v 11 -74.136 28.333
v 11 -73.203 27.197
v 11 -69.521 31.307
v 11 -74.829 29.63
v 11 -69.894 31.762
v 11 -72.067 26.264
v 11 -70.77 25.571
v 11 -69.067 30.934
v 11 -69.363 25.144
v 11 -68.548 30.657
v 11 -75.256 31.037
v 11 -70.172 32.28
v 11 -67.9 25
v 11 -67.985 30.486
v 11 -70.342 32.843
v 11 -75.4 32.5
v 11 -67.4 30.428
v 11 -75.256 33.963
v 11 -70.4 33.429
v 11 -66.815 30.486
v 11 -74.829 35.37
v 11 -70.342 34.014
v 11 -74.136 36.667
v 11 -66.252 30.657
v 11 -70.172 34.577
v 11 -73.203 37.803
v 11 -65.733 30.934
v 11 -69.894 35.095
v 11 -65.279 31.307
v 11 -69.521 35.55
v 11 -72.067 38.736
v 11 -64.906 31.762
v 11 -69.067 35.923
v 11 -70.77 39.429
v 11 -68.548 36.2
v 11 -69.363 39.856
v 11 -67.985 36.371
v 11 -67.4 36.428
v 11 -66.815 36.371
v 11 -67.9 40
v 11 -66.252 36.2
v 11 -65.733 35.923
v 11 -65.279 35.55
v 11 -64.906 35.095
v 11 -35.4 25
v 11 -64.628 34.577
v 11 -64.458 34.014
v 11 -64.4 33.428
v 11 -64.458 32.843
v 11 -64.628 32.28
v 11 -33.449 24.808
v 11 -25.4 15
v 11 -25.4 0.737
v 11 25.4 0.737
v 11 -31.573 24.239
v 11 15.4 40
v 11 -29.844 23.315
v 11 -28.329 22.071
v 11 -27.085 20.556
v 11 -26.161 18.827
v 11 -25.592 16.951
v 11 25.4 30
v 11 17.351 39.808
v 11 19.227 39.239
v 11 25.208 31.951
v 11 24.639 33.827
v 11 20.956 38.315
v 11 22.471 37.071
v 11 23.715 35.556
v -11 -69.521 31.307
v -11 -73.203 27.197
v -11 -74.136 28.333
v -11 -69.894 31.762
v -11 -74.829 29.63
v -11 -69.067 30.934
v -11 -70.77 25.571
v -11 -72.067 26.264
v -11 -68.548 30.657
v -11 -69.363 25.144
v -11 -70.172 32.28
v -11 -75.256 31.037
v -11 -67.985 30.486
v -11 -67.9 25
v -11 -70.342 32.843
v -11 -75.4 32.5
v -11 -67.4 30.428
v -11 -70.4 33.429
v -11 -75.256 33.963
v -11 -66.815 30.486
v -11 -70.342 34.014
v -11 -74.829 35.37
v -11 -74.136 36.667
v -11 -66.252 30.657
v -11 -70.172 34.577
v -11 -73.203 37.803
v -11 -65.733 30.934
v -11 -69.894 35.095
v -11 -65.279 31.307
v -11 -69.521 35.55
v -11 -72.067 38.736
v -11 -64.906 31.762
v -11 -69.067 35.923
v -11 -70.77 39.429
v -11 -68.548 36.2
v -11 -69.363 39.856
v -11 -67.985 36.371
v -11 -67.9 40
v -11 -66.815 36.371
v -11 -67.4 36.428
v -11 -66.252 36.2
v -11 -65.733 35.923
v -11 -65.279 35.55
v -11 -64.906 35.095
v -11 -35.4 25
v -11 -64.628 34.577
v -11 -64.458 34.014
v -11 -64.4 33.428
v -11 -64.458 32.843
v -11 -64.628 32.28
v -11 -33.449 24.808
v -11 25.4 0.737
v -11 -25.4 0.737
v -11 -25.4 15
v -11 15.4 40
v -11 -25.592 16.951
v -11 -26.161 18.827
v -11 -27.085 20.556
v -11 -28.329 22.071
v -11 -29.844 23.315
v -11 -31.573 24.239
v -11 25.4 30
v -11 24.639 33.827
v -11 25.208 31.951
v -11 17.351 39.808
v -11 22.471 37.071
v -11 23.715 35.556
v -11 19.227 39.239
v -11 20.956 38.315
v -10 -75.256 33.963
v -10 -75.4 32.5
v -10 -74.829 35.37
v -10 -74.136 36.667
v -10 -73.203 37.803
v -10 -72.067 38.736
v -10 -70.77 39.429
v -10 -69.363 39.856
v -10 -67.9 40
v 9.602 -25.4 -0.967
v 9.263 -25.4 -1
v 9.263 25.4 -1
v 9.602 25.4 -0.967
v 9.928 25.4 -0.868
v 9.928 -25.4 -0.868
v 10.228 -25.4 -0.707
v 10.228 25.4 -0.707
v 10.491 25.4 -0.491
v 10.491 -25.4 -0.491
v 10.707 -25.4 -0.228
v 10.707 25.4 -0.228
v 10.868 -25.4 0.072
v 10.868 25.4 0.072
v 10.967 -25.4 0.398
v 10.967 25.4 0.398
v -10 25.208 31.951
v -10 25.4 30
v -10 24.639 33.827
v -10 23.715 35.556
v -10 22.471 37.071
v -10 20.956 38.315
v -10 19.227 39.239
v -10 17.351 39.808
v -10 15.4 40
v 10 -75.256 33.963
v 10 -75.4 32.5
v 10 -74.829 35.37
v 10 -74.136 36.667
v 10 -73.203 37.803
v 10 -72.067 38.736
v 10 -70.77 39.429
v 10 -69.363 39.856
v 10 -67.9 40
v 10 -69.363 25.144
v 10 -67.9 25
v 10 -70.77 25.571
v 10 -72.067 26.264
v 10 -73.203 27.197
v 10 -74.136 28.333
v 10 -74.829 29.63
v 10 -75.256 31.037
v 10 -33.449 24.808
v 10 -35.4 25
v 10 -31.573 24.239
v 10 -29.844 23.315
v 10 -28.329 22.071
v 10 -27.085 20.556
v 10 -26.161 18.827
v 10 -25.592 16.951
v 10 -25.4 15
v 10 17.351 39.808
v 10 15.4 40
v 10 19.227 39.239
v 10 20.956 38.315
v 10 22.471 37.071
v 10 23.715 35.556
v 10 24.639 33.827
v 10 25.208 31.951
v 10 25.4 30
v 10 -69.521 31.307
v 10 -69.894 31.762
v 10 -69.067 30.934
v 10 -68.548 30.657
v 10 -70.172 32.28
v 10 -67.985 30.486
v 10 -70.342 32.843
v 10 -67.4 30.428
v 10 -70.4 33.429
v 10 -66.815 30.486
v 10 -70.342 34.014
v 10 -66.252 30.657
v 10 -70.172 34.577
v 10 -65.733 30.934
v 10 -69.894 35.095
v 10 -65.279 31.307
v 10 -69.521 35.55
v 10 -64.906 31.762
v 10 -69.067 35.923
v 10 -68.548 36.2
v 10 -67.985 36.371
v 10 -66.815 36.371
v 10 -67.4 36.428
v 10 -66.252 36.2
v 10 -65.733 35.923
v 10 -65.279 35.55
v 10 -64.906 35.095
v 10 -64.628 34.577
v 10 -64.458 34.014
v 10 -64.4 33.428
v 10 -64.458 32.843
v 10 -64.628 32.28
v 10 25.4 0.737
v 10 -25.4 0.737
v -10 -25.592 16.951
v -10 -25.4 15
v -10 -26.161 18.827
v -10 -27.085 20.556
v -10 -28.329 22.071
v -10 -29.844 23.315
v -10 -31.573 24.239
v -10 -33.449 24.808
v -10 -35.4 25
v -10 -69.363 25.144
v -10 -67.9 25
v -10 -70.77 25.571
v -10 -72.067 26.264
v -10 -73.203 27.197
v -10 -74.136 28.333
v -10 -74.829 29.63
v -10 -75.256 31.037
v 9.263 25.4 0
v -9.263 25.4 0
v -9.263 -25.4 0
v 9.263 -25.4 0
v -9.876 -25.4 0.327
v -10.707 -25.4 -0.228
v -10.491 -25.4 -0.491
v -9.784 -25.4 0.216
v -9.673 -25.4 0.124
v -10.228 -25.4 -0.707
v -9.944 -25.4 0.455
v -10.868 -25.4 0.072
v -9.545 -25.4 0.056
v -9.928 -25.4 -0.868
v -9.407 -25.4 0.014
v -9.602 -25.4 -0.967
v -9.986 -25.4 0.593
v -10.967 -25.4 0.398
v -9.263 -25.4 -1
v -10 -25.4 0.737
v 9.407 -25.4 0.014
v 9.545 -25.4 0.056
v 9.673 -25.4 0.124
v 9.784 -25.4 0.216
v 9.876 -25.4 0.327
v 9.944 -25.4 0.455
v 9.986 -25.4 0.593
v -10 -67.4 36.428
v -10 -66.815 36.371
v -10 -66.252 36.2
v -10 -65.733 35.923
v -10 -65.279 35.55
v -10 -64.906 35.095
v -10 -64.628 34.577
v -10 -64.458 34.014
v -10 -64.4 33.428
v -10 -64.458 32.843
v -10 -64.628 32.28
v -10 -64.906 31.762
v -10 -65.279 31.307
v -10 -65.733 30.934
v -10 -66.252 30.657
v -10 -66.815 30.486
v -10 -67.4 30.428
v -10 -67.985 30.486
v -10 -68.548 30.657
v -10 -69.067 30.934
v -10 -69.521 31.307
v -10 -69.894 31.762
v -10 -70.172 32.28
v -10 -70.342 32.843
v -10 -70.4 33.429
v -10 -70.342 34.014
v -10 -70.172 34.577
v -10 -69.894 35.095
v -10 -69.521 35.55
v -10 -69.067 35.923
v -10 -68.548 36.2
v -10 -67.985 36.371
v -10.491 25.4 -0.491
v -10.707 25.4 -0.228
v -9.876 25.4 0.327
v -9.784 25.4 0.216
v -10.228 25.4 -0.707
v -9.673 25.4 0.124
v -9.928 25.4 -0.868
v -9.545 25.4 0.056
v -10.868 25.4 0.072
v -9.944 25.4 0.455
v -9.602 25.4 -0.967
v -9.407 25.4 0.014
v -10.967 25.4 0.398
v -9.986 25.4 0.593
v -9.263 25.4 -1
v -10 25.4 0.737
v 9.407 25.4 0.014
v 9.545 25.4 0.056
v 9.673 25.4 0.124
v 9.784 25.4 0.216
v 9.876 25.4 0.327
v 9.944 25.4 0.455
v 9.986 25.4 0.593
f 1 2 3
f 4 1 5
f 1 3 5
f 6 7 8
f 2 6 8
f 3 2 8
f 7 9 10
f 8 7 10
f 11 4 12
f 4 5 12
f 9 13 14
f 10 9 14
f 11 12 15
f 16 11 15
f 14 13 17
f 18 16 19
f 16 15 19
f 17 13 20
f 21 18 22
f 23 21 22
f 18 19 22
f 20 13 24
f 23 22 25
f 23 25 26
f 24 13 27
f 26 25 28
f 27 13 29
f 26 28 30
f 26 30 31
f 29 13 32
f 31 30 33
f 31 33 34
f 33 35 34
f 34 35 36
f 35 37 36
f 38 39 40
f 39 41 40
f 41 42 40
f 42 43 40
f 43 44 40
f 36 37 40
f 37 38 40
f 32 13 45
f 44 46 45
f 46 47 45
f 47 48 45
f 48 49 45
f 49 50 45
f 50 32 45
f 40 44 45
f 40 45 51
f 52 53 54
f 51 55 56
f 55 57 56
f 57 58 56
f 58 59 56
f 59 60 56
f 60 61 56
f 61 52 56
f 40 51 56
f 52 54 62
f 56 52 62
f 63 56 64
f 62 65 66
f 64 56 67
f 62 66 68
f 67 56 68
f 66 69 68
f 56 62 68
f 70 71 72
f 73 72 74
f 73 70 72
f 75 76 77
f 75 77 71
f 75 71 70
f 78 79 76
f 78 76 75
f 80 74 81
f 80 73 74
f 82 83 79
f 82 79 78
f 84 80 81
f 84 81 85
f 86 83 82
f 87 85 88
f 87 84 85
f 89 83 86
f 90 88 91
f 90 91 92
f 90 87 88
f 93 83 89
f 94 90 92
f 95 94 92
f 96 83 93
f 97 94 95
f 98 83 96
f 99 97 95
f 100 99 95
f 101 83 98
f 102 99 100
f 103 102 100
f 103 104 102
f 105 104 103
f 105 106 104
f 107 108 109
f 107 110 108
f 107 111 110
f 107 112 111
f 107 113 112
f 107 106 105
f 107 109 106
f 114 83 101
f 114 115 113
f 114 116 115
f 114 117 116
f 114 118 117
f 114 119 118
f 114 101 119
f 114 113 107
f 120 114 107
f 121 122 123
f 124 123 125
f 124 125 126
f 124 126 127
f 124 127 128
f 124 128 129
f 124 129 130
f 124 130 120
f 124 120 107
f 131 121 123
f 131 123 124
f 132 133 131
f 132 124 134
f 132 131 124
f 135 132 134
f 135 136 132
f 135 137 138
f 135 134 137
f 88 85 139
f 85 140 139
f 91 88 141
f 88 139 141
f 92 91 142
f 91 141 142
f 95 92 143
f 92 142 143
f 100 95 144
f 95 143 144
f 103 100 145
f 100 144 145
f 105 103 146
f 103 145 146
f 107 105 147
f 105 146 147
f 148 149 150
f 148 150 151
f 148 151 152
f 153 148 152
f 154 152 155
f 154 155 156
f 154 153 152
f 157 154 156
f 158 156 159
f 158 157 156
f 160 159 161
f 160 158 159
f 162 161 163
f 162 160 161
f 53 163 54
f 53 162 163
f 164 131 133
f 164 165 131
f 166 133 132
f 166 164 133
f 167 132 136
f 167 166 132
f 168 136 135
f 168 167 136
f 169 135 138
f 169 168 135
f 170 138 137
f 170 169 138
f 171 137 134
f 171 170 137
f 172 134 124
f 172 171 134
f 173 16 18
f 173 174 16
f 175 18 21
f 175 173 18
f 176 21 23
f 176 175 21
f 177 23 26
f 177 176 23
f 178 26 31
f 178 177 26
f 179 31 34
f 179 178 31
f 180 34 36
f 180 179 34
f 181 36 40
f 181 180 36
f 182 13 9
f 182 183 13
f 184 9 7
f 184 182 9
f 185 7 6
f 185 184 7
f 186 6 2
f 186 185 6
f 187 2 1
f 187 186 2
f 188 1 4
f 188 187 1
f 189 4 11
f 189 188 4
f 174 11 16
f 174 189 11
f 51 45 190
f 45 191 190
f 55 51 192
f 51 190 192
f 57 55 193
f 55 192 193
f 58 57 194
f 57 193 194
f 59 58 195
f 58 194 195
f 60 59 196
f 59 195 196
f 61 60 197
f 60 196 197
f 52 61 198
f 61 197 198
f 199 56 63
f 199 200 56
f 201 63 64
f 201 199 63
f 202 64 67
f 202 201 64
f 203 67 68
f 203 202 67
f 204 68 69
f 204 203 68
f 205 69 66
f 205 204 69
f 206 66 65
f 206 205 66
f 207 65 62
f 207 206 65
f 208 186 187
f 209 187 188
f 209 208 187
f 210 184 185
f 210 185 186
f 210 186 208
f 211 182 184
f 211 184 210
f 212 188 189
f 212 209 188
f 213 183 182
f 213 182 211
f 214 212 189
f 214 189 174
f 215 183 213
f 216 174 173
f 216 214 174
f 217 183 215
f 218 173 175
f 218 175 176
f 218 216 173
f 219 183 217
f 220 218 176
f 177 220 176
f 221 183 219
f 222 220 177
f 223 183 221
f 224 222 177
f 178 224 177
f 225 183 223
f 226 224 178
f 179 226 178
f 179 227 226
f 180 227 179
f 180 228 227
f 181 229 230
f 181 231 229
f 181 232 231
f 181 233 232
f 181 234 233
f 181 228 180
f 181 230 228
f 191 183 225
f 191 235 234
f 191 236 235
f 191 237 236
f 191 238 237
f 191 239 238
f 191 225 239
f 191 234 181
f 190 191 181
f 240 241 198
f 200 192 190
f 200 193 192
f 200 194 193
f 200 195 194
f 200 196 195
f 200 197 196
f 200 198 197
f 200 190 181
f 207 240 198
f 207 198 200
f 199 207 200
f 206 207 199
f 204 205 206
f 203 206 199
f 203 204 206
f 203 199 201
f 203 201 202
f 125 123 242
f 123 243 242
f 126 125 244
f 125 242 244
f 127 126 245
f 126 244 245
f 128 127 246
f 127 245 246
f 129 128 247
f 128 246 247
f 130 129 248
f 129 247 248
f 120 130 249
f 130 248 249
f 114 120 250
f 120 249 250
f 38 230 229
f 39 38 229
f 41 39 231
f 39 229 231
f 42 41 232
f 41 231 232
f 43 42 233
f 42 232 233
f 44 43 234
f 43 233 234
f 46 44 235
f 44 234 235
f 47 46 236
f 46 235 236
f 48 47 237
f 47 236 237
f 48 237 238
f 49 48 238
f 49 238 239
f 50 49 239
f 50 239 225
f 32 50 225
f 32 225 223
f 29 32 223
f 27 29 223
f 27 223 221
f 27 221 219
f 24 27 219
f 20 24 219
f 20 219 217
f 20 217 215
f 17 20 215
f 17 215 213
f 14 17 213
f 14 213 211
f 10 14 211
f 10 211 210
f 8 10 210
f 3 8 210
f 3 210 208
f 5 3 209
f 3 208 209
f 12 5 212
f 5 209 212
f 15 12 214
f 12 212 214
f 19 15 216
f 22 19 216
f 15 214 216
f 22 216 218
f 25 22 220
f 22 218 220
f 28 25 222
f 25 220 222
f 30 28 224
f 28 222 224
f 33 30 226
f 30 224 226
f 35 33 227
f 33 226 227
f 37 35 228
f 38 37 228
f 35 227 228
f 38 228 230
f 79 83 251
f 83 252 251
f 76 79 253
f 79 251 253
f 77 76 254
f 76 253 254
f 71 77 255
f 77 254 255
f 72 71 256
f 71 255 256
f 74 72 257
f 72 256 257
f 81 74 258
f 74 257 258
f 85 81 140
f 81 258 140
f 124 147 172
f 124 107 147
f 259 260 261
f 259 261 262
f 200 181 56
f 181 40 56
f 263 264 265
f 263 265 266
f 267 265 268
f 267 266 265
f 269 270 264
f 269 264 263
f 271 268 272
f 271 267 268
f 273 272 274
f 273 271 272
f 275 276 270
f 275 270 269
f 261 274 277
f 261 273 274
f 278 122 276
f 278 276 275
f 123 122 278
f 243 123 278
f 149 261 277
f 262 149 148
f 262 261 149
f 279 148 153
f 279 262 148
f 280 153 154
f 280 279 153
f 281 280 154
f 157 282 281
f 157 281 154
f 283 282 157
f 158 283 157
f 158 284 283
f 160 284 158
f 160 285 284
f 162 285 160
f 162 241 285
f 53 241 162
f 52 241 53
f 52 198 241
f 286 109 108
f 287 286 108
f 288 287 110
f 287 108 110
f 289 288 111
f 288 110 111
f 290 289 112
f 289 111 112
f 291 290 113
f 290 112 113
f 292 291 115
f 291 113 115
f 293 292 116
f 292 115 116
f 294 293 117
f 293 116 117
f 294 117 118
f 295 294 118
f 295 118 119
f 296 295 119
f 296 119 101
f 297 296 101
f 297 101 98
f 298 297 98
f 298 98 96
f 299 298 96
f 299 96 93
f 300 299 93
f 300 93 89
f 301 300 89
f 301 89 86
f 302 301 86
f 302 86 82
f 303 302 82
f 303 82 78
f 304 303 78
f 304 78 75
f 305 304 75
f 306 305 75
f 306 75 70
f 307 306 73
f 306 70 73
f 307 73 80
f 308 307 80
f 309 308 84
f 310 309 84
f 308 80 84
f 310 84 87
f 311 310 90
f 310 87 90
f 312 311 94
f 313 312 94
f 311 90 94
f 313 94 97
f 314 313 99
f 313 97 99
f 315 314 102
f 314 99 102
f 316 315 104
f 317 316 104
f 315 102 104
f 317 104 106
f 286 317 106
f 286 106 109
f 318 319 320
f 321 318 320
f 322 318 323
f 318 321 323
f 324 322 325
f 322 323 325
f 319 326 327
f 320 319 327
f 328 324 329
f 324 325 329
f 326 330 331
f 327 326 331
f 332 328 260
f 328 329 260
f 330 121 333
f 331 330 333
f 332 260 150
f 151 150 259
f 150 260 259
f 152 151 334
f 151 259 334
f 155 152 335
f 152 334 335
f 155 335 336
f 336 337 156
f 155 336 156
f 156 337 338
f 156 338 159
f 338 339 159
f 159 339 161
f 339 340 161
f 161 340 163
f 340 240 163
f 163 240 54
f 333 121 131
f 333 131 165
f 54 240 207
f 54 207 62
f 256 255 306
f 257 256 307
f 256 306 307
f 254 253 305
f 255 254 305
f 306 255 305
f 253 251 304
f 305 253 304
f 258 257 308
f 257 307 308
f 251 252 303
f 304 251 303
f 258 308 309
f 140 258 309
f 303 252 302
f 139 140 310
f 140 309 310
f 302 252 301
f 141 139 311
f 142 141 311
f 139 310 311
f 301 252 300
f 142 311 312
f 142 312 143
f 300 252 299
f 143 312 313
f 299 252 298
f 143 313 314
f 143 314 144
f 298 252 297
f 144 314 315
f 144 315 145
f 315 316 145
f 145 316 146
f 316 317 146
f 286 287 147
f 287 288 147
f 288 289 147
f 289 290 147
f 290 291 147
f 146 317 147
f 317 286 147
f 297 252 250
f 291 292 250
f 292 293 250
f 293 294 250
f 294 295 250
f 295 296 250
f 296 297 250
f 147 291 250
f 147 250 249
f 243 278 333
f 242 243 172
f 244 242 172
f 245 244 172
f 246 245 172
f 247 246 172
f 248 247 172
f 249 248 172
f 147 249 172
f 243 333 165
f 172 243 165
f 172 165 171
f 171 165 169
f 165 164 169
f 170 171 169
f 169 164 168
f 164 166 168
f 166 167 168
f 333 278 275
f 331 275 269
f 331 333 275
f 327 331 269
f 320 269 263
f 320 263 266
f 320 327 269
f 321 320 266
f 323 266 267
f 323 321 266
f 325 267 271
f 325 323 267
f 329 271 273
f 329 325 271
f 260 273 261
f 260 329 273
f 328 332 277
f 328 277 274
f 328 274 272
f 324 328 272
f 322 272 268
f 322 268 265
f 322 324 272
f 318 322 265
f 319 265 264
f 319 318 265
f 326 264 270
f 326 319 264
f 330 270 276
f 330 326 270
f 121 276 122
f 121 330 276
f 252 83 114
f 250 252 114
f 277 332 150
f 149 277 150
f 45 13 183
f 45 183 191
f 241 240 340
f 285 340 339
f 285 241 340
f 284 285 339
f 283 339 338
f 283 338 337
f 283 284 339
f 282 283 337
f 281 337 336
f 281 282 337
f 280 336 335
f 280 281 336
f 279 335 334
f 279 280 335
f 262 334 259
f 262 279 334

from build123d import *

# Parameters (mm, degrees)
CROQUIS1_W                         = 20
CROQUIS1_H                         = 50.8
BRIDA_BASE1_DEPTH                  = 1
BRIDA_DE_ARISTA1_STRIP_W           = 5.4732
BRIDA_DE_ARISTA1_STRIP_H           = 1
BRIDA_DE_ARISTA1_STRIP_CUT_DEPTH   = 50.8
BRIDA_DE_ARISTA1_STRIP_2_W         = 5.4732
BRIDA_DE_ARISTA1_STRIP_2_H         = 1
BRIDA_DE_ARISTA1_STRIP_CUT_2_DEPTH = 50.8
BRIDA_DE_ARISTA1_DEPTH             = 50.8
BRIDA_DE_ARISTA1_BEND_DEPTH        = 50.8
CROQUIS14_W                        = 15
CROQUIS14_H                        = 50
PESTA_A1_DEPTH                     = 1
CROQUIS17_R                        = 3
CORTAR_EXTRUIR1_DEPTH              = 89.14283862
REDONDEO1_R                        = 10
REDONDEO2_R                        = 7.5


# Sheet-metal steps are written as plain solids
with BuildPart() as part:
    # Croquis1 → Brida base1 (new body)
    with BuildSketch(Plane.XY):
        Rectangle(CROQUIS1_W, CROQUIS1_H)
    extrude(amount=-BRIDA_BASE1_DEPTH)

    # Brida de arista1 strip (across the edge) → Brida de arista1 strip cut (cut)
    with BuildSketch(Plane(origin=(-10, 25.4, 0), x_dir=(1, 0, 0), z_dir=(0, -1, 0))):
        with Locations((-2, -0.5)):
            Rectangle(BRIDA_DE_ARISTA1_STRIP_W, BRIDA_DE_ARISTA1_STRIP_H)
    extrude(amount=BRIDA_DE_ARISTA1_STRIP_CUT_DEPTH, mode=Mode.SUBTRACT)

    # Brida de arista1 strip 2 (across the edge) → Brida de arista1 strip cut 2 (cut)
    with BuildSketch(Plane(origin=(10, -25.4, 0), x_dir=(-1, 0, 0), z_dir=(0, 1, 0))):
        with Locations((-2, -0.5)):
            Rectangle(BRIDA_DE_ARISTA1_STRIP_2_W, BRIDA_DE_ARISTA1_STRIP_2_H)
    extrude(amount=BRIDA_DE_ARISTA1_STRIP_CUT_2_DEPTH, mode=Mode.SUBTRACT)

    # Brida de arista1 section (across the edge) → Brida de arista1 (add)
    with BuildSketch(Plane(origin=(-10, 25.4, 0), x_dir=(1, 0, 0), z_dir=(0, -1, 0))):
        with BuildLine():
            Line((-1, 0.7366), (-1, 40))
            Line((-1, 40), (0, 40))
            Line((0, 40), (0, 0.7366))
            ThreePointArc((0, 0.7366), (0.215745145, 0.215745145), (0.7366, 0))
            Line((0.7366, 0), (0.7366, -1))
            ThreePointArc((0.7366, -1), (-0.491361636, -0.491361636), (-1, 0.7366))
        make_face()
    extrude(amount=BRIDA_DE_ARISTA1_DEPTH)

    # Brida de arista1 section 2 (across the edge) → Brida de arista1 bend (add)
    with BuildSketch(Plane(origin=(10, -25.4, 0), x_dir=(-1, 0, 0), z_dir=(0, 1, 0))):
        with BuildLine():
            Line((-1, 0.7366), (-1, 40))
            Line((-1, 40), (0, 40))
            Line((0, 40), (0, 0.7366))
            ThreePointArc((0, 0.7366), (0.215745145, 0.215745145), (0.7366, 0))
            Line((0.7366, 0), (0.7366, -1))
            ThreePointArc((0.7366, -1), (-0.491361636, -0.491361636), (-1, 0.7366))
        make_face()
    extrude(amount=BRIDA_DE_ARISTA1_BEND_DEPTH)

    # Croquis14 → Pestaña1 (add)
    with BuildSketch(Plane.ZY.offset(11)):
        with Locations((32.5, -50.4)):
            Rectangle(CROQUIS14_W, CROQUIS14_H)
    pesta_a1 = extrude(amount=-PESTA_A1_DEPTH)

    # Simetría1: Pestaña1 across plane
    add(pesta_a1.mirror(Plane(origin=(0, 0, 0), x_dir=(0, 0, 1), z_dir=(1, 0, 0))))

    # Croquis17 → Cortar-Extruir1 (cut, through all)
    with BuildSketch(Plane.ZY.offset(11)):
        with Locations((33.4285, -67.4)):
            Circle(CROQUIS17_R)
    extrude(amount=-CORTAR_EXTRUIR1_DEPTH, mode=Mode.SUBTRACT)

    # Redondeo1
    redondeo1_edges = [part.edges().sort_by_distance(p)[0] for p in [
        (-10.5, 25.4, 40),
        (10.5, 25.4, 40),
        (-10.5, -25.4, 25),
        (10.5, -25.4, 25),
    ]]
    fillet(redondeo1_edges, radius=REDONDEO1_R)

    # Redondeo2
    redondeo2_edges = [part.edges().sort_by_distance(p)[0] for p in [
        (10.5, -75.4, 25),
        (10.5, -75.4, 40),
        (-10.5, -75.4, 25),
        (-10.5, -75.4, 40),
    ]]
    fillet(redondeo2_edges, radius=REDONDEO2_R - 0.0001)  # a hair under: the kernel refuses the full size


solid = part.part
